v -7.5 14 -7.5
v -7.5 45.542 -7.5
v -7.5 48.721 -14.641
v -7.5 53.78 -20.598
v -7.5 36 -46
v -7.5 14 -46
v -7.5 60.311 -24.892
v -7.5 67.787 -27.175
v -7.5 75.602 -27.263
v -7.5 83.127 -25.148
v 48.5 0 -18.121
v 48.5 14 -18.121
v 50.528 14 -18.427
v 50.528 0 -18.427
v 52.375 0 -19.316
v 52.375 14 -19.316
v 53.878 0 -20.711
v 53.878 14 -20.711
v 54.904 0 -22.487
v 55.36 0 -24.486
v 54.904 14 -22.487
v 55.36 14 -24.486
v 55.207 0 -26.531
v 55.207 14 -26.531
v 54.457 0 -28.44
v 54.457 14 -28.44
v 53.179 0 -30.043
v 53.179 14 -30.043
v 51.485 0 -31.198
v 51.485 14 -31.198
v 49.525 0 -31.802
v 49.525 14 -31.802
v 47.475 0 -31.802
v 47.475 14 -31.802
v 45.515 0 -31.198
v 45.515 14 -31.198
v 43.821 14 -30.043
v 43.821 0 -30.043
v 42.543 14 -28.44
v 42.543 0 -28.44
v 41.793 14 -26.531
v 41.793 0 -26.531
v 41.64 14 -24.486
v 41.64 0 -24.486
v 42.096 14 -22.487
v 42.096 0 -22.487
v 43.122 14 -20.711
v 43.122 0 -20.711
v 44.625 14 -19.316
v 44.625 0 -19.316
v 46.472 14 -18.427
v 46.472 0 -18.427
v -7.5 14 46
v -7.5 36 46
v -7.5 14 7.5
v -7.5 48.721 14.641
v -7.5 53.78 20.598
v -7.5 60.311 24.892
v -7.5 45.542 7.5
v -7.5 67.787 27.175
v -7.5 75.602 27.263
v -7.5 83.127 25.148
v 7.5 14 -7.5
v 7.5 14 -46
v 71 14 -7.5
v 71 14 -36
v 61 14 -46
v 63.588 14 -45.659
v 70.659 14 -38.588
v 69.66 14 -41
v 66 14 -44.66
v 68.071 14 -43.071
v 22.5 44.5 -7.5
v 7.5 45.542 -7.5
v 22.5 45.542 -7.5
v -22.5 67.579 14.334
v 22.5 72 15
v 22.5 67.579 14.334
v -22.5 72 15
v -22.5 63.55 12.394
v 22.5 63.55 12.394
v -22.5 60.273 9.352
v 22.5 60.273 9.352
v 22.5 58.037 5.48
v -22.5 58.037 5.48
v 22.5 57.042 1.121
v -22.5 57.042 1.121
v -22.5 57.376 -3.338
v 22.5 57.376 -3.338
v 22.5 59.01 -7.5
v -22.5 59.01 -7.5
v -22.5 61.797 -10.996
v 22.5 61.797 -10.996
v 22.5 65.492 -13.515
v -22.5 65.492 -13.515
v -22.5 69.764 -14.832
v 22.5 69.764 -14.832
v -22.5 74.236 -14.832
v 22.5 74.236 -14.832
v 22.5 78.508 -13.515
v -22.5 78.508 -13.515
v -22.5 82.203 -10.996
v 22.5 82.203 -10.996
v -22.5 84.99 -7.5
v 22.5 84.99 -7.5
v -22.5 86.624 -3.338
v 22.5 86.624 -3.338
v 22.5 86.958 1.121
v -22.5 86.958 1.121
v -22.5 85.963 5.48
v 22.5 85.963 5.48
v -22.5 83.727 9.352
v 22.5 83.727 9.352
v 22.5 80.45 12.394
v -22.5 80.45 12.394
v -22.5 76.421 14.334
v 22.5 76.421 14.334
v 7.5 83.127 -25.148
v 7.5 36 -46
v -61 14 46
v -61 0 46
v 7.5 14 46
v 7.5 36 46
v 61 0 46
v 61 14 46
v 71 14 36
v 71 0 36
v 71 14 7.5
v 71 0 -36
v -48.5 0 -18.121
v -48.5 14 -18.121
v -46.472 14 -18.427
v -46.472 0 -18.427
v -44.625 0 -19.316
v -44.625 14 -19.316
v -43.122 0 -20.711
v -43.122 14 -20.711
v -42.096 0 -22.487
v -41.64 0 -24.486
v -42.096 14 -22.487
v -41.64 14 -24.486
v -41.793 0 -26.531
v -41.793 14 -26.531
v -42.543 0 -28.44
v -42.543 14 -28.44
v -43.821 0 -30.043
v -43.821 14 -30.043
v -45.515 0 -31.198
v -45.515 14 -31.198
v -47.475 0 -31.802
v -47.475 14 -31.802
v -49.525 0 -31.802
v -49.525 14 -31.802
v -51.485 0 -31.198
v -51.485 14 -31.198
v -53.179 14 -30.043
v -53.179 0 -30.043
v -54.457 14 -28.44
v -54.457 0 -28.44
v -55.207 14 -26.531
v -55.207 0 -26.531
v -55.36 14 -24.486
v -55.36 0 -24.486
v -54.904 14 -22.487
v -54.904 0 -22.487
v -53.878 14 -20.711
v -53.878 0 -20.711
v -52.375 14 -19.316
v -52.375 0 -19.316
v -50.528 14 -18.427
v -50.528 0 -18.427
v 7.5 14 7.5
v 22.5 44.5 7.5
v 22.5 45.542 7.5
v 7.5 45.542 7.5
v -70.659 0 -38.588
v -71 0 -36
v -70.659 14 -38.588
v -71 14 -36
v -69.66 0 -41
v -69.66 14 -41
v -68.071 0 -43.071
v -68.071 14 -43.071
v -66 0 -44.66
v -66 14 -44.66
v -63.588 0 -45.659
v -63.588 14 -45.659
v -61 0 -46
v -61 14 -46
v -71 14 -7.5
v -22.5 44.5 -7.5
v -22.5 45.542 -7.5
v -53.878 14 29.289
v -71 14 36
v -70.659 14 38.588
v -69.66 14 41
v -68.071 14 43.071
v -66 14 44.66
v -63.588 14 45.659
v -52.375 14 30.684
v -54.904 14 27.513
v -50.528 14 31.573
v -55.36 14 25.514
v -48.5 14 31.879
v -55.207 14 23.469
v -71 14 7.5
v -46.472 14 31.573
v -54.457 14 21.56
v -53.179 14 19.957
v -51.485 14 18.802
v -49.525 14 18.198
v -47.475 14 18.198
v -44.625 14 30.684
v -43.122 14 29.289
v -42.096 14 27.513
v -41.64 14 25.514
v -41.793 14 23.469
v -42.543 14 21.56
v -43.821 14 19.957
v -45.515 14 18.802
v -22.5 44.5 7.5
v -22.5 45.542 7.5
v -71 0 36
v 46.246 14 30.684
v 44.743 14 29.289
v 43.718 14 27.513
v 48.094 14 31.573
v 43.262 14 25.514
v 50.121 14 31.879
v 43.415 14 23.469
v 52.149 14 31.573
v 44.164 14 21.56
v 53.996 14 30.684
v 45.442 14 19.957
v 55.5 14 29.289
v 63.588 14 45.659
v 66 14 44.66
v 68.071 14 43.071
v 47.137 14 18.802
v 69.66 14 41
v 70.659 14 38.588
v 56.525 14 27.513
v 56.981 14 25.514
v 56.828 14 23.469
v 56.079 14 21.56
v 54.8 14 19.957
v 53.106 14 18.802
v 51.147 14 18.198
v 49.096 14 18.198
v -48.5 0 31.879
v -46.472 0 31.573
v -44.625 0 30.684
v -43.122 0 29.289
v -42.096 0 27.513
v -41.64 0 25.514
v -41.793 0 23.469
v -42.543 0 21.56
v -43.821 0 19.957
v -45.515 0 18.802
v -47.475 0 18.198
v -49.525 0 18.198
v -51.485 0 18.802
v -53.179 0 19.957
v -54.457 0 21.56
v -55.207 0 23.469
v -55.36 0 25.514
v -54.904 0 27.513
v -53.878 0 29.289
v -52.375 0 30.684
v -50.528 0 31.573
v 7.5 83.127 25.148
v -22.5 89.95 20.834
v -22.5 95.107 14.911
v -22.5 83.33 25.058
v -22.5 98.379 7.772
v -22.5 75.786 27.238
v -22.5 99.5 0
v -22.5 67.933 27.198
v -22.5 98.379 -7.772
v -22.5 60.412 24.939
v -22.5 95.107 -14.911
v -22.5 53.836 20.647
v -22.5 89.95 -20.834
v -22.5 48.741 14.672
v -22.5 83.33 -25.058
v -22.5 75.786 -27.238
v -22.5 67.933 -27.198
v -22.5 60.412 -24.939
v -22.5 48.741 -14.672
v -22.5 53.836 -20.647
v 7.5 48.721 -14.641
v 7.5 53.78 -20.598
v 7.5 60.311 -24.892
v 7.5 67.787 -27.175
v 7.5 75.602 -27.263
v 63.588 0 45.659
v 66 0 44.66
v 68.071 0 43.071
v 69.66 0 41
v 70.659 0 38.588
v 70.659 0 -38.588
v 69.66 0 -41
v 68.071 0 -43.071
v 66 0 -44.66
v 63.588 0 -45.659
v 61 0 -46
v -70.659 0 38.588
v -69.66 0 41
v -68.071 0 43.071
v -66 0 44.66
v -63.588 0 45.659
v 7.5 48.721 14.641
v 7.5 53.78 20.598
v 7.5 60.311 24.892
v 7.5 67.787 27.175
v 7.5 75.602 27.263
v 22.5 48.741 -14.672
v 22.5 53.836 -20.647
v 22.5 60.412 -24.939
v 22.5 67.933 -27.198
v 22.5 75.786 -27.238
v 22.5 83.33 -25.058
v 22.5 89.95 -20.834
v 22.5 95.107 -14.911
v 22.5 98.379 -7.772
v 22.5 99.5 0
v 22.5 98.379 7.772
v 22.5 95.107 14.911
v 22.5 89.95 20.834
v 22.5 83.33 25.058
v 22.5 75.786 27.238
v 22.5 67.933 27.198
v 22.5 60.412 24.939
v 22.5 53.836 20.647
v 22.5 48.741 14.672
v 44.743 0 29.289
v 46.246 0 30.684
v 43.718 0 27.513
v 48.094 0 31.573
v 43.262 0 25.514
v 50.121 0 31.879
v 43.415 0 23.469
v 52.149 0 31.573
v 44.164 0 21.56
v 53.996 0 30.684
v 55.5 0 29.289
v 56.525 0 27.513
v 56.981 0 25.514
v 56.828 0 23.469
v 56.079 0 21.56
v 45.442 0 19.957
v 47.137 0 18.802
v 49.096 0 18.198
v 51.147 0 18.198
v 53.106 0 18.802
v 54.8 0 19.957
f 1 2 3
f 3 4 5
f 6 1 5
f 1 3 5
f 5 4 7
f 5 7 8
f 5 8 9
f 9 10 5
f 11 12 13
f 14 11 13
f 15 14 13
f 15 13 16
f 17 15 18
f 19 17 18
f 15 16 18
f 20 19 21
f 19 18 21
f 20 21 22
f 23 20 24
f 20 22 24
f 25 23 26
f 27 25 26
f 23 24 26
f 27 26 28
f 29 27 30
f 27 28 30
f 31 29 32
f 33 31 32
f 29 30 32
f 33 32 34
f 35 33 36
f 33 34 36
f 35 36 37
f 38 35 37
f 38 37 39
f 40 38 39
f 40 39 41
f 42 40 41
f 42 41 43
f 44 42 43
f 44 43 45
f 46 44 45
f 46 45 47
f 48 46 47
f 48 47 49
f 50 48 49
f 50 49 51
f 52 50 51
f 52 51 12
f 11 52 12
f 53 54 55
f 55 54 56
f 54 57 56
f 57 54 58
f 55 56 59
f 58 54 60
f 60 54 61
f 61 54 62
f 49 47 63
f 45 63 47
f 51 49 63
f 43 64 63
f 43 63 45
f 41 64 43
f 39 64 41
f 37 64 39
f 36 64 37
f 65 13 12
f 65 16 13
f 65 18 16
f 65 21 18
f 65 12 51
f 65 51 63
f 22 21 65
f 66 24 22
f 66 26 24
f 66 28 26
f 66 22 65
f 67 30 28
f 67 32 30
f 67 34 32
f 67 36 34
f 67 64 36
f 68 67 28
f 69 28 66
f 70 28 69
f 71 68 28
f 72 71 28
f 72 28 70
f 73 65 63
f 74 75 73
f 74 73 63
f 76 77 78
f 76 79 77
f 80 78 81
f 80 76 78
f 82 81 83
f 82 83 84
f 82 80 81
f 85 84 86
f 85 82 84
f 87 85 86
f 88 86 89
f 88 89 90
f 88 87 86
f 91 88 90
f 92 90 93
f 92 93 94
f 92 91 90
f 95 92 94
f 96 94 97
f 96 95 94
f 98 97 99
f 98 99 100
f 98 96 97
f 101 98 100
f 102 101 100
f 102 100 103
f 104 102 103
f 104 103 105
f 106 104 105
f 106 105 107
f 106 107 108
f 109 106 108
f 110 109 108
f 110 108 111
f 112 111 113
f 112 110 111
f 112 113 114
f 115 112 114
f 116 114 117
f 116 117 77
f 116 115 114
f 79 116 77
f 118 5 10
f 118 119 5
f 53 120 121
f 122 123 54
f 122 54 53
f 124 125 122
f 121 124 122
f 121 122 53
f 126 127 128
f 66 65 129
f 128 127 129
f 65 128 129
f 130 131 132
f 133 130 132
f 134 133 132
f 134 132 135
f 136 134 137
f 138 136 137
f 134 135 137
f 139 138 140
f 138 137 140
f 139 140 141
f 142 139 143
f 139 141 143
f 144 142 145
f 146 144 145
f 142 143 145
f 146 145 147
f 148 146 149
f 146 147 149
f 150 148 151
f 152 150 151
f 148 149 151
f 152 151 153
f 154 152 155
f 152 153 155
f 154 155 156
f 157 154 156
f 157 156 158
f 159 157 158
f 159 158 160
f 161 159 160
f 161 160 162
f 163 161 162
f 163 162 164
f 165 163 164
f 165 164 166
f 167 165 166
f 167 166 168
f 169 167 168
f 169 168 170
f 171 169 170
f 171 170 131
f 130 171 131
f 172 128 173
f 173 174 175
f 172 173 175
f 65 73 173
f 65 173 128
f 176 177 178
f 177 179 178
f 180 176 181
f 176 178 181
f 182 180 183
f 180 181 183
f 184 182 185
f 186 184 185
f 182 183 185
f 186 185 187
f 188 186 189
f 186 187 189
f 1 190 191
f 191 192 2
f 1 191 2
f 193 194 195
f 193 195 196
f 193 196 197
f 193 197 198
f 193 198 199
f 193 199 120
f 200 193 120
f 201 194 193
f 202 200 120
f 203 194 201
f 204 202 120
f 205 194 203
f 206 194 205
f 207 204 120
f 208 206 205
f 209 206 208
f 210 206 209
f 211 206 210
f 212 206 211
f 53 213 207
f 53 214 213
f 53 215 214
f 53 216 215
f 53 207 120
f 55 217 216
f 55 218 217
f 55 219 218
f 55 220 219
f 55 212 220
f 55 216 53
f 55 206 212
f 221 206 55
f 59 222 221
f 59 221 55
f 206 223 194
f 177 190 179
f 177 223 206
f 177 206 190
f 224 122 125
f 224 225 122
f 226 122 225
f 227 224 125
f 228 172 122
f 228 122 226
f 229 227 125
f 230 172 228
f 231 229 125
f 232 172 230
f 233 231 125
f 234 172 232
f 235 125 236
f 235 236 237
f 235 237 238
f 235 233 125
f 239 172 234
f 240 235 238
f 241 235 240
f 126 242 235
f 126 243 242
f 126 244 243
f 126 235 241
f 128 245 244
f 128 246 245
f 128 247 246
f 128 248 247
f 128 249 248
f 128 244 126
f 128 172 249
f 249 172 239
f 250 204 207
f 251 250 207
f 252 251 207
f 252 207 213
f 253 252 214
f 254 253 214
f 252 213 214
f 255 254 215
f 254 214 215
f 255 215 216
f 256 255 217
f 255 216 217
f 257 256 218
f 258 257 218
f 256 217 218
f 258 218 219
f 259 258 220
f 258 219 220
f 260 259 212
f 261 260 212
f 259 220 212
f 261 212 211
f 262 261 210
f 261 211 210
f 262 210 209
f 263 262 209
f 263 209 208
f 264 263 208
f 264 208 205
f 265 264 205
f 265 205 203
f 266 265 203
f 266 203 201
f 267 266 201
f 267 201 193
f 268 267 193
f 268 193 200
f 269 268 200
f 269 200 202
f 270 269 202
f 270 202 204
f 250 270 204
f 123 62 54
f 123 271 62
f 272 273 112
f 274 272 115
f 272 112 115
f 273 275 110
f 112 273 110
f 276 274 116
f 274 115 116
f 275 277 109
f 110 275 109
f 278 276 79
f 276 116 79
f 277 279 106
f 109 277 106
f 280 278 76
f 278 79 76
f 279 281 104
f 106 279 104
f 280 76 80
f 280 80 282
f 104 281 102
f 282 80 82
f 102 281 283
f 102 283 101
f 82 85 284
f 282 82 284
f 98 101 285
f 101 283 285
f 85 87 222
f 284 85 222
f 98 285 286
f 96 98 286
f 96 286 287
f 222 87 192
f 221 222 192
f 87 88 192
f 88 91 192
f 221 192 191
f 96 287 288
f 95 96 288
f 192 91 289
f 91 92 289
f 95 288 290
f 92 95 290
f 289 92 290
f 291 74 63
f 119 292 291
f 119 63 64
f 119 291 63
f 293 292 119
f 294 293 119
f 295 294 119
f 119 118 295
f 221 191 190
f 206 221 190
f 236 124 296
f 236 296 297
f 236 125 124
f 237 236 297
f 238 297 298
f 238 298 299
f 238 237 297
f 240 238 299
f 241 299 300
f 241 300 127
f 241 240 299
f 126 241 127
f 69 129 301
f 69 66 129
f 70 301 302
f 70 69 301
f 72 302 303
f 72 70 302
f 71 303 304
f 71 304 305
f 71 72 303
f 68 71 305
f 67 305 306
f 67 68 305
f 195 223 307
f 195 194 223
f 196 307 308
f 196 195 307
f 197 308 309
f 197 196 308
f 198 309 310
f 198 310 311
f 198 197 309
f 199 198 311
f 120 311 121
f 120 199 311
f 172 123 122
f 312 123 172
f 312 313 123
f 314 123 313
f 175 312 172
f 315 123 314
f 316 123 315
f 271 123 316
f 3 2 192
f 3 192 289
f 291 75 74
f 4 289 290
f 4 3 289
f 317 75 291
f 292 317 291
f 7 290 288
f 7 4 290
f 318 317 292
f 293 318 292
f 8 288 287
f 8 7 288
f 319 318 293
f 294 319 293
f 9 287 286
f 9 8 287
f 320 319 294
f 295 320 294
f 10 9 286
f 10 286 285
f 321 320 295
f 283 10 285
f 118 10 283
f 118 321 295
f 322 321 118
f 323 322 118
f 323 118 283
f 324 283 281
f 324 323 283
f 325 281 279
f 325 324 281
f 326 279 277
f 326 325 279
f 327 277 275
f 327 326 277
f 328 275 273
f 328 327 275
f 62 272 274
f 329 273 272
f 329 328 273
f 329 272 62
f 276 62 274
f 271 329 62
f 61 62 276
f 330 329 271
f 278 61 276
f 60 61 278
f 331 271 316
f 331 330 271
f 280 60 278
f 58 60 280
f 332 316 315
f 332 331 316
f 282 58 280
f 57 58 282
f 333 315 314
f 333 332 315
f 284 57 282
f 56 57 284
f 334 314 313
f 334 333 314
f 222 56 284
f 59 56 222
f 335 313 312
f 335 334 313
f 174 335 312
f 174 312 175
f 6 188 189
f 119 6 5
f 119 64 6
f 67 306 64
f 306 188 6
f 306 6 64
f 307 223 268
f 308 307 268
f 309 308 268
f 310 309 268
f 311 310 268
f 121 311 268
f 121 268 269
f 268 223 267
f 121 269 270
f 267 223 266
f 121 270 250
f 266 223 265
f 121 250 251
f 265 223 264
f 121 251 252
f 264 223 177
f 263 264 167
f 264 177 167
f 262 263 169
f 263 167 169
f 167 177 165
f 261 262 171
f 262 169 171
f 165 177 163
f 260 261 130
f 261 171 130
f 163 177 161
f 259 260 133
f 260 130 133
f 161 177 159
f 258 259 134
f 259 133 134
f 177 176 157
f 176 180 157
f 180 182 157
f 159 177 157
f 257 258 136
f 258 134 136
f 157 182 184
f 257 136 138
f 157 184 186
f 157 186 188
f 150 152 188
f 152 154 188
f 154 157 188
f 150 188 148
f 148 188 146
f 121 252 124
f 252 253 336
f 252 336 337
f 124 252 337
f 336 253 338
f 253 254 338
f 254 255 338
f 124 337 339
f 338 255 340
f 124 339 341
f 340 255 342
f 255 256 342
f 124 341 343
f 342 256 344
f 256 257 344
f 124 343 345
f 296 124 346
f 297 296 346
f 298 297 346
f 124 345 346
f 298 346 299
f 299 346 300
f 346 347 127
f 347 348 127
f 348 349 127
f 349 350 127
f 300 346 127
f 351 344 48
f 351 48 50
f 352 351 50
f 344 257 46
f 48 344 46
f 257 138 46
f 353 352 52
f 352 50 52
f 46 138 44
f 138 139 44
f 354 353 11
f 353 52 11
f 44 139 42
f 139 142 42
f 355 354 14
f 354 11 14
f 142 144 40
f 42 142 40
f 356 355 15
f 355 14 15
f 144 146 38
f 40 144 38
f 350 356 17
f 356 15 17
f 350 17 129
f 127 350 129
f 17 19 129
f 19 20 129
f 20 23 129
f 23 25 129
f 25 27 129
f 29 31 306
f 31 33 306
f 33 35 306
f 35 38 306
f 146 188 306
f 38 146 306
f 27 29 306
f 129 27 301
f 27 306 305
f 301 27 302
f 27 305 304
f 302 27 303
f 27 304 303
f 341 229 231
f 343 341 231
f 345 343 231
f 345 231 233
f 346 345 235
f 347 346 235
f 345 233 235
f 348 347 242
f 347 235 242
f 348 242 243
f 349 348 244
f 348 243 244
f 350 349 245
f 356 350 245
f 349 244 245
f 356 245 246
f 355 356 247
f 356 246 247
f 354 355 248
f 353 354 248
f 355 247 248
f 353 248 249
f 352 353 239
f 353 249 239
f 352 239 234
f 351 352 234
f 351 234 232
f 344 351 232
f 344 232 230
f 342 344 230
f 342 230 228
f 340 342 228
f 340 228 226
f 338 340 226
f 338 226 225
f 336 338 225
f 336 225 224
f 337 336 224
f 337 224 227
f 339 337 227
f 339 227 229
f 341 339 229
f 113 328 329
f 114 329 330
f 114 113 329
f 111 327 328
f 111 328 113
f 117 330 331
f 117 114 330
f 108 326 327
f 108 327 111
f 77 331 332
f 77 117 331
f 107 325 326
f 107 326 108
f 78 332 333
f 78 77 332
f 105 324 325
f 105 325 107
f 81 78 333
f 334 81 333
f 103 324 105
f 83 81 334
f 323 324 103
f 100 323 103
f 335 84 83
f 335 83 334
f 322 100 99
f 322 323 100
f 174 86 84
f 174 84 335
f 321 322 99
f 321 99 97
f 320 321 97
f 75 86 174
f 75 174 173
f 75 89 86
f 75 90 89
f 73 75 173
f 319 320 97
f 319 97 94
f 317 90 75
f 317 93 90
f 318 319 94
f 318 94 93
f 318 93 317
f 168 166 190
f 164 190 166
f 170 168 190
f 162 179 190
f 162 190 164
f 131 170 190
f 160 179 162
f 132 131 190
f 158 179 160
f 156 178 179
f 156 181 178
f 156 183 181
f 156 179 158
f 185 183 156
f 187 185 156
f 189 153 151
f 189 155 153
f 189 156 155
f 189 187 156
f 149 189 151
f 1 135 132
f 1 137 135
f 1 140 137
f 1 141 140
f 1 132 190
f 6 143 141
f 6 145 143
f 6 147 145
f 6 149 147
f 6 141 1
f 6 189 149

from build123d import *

# Parameters (mm, degrees)
SKETCH1_W           = 142
SKETCH1_H           = 92
BOSS_EXTRUDE1_DEPTH = 14
FILLET1_R           = 10
SKETCH2_R           = 27.5
SKETCH2_R_2         = 15
BOSS_EXTRUDE2_DEPTH = 22.5
BOSS_EXTRUDE3_DEPTH = 7.5
RIB1_START          = -7.5
RIB1_DEPTH          = 15
SKETCH6_R           = 6.879028827
CUT_EXTRUDE1_DEPTH  = 121.279881942


with BuildPart() as part:
    # Sketch1 → Boss-Extrude1 (new body)
    with BuildSketch(Plane(origin=(0, 0, 0), x_dir=(1, 0, 0), z_dir=(0, 1, 0))):
        Rectangle(SKETCH1_W, SKETCH1_H)
    extrude(amount=BOSS_EXTRUDE1_DEPTH)

    # Fillet1
    fillet1_edges = [part.edges().sort_by_distance(p)[0] for p in [
        (71, 7, 46),
        (-71, 7, 46),
        (-71, 7, -46),
        (71, 7, -46),
    ]]
    fillet(fillet1_edges, radius=FILLET1_R)



with BuildPart() as body_2:
    # Sketch2 → Boss-Extrude2 (new, symmetric)
    with BuildSketch(Plane(origin=(0, 0, 0), x_dir=(0, 0, -1), z_dir=(1, 0, 0))):
        with Locations(Location((0, 72, 0), (0, 0, 180))):
            Circle(SKETCH2_R)
        with Locations(Location((0, 72, 0), (0, 0, 180))):
            Circle(SKETCH2_R_2, mode=Mode.SUBTRACT)
    extrude(amount=BOSS_EXTRUDE2_DEPTH, both=True)


with BuildPart() as part_1:
    add(part.part)

    add(body_2.part)  # Boss-Extrude3 merges body 2
    # Sketch4 → Boss-Extrude3 (add, symmetric)
    with BuildSketch(Plane(origin=(0, 0, 0), x_dir=(0, 0, -1), z_dir=(1, 0, 0))):
        with BuildLine():
            Line((-25.148338126, 83.127043161), (-46, 36))
            Line((-46, 36), (-46, 14))
            Line((-46, 14), (46, 14))
            Line((46, 14), (46, 36))
            Line((46, 36), (25.148338126, 83.127043161))
            ThreePointArc((25.148338126, 83.127043161), (0, 44.5), (-25.148338126, 83.127043161))
        make_face()
    extrude(amount=BOSS_EXTRUDE3_DEPTH, both=True)

    # Rib1: read off the stored shape, not the designer's step
    # Rib1 outline → Rib1 (add)
    with BuildSketch(Plane.XY.offset(RIB1_START)):
        Polygon((-7.5, 14), (-7.5, 45.542486889), (-22.5, 45.542486889), (-22.5, 44.5), (-71, 14), align=None)
    rib1 = extrude(amount=RIB1_DEPTH)

    # Mirror1: Rib1 across plane
    add(rib1.mirror(Plane(origin=(0, 0, 0), x_dir=(0, 0, 1), z_dir=(1, 0, 0))))

    # Sketch6 → Cut-Extrude1 (cut, through all)
    with BuildSketch(Plane(origin=(0, 14, 0), x_dir=(1, 0, 0), z_dir=(0, 1, 0))):
        with Locations(Location((-48.5, 25, 0), (0, 0, 270))):
            Circle(SKETCH6_R)
        with Locations(Location((-48.5, -25, 0), (0, 0, 270))):
            Circle(SKETCH6_R)
        with Locations(Location((48.5, 25, 0), (0, 0, 270))):
            Circle(SKETCH6_R)
        with Locations(Location((50.121402644, -25, 0), (0, 0, 270))):
            Circle(SKETCH6_R)
    extrude(amount=-CUT_EXTRUDE1_DEPTH, mode=Mode.SUBTRACT)


solid = part_1.part
